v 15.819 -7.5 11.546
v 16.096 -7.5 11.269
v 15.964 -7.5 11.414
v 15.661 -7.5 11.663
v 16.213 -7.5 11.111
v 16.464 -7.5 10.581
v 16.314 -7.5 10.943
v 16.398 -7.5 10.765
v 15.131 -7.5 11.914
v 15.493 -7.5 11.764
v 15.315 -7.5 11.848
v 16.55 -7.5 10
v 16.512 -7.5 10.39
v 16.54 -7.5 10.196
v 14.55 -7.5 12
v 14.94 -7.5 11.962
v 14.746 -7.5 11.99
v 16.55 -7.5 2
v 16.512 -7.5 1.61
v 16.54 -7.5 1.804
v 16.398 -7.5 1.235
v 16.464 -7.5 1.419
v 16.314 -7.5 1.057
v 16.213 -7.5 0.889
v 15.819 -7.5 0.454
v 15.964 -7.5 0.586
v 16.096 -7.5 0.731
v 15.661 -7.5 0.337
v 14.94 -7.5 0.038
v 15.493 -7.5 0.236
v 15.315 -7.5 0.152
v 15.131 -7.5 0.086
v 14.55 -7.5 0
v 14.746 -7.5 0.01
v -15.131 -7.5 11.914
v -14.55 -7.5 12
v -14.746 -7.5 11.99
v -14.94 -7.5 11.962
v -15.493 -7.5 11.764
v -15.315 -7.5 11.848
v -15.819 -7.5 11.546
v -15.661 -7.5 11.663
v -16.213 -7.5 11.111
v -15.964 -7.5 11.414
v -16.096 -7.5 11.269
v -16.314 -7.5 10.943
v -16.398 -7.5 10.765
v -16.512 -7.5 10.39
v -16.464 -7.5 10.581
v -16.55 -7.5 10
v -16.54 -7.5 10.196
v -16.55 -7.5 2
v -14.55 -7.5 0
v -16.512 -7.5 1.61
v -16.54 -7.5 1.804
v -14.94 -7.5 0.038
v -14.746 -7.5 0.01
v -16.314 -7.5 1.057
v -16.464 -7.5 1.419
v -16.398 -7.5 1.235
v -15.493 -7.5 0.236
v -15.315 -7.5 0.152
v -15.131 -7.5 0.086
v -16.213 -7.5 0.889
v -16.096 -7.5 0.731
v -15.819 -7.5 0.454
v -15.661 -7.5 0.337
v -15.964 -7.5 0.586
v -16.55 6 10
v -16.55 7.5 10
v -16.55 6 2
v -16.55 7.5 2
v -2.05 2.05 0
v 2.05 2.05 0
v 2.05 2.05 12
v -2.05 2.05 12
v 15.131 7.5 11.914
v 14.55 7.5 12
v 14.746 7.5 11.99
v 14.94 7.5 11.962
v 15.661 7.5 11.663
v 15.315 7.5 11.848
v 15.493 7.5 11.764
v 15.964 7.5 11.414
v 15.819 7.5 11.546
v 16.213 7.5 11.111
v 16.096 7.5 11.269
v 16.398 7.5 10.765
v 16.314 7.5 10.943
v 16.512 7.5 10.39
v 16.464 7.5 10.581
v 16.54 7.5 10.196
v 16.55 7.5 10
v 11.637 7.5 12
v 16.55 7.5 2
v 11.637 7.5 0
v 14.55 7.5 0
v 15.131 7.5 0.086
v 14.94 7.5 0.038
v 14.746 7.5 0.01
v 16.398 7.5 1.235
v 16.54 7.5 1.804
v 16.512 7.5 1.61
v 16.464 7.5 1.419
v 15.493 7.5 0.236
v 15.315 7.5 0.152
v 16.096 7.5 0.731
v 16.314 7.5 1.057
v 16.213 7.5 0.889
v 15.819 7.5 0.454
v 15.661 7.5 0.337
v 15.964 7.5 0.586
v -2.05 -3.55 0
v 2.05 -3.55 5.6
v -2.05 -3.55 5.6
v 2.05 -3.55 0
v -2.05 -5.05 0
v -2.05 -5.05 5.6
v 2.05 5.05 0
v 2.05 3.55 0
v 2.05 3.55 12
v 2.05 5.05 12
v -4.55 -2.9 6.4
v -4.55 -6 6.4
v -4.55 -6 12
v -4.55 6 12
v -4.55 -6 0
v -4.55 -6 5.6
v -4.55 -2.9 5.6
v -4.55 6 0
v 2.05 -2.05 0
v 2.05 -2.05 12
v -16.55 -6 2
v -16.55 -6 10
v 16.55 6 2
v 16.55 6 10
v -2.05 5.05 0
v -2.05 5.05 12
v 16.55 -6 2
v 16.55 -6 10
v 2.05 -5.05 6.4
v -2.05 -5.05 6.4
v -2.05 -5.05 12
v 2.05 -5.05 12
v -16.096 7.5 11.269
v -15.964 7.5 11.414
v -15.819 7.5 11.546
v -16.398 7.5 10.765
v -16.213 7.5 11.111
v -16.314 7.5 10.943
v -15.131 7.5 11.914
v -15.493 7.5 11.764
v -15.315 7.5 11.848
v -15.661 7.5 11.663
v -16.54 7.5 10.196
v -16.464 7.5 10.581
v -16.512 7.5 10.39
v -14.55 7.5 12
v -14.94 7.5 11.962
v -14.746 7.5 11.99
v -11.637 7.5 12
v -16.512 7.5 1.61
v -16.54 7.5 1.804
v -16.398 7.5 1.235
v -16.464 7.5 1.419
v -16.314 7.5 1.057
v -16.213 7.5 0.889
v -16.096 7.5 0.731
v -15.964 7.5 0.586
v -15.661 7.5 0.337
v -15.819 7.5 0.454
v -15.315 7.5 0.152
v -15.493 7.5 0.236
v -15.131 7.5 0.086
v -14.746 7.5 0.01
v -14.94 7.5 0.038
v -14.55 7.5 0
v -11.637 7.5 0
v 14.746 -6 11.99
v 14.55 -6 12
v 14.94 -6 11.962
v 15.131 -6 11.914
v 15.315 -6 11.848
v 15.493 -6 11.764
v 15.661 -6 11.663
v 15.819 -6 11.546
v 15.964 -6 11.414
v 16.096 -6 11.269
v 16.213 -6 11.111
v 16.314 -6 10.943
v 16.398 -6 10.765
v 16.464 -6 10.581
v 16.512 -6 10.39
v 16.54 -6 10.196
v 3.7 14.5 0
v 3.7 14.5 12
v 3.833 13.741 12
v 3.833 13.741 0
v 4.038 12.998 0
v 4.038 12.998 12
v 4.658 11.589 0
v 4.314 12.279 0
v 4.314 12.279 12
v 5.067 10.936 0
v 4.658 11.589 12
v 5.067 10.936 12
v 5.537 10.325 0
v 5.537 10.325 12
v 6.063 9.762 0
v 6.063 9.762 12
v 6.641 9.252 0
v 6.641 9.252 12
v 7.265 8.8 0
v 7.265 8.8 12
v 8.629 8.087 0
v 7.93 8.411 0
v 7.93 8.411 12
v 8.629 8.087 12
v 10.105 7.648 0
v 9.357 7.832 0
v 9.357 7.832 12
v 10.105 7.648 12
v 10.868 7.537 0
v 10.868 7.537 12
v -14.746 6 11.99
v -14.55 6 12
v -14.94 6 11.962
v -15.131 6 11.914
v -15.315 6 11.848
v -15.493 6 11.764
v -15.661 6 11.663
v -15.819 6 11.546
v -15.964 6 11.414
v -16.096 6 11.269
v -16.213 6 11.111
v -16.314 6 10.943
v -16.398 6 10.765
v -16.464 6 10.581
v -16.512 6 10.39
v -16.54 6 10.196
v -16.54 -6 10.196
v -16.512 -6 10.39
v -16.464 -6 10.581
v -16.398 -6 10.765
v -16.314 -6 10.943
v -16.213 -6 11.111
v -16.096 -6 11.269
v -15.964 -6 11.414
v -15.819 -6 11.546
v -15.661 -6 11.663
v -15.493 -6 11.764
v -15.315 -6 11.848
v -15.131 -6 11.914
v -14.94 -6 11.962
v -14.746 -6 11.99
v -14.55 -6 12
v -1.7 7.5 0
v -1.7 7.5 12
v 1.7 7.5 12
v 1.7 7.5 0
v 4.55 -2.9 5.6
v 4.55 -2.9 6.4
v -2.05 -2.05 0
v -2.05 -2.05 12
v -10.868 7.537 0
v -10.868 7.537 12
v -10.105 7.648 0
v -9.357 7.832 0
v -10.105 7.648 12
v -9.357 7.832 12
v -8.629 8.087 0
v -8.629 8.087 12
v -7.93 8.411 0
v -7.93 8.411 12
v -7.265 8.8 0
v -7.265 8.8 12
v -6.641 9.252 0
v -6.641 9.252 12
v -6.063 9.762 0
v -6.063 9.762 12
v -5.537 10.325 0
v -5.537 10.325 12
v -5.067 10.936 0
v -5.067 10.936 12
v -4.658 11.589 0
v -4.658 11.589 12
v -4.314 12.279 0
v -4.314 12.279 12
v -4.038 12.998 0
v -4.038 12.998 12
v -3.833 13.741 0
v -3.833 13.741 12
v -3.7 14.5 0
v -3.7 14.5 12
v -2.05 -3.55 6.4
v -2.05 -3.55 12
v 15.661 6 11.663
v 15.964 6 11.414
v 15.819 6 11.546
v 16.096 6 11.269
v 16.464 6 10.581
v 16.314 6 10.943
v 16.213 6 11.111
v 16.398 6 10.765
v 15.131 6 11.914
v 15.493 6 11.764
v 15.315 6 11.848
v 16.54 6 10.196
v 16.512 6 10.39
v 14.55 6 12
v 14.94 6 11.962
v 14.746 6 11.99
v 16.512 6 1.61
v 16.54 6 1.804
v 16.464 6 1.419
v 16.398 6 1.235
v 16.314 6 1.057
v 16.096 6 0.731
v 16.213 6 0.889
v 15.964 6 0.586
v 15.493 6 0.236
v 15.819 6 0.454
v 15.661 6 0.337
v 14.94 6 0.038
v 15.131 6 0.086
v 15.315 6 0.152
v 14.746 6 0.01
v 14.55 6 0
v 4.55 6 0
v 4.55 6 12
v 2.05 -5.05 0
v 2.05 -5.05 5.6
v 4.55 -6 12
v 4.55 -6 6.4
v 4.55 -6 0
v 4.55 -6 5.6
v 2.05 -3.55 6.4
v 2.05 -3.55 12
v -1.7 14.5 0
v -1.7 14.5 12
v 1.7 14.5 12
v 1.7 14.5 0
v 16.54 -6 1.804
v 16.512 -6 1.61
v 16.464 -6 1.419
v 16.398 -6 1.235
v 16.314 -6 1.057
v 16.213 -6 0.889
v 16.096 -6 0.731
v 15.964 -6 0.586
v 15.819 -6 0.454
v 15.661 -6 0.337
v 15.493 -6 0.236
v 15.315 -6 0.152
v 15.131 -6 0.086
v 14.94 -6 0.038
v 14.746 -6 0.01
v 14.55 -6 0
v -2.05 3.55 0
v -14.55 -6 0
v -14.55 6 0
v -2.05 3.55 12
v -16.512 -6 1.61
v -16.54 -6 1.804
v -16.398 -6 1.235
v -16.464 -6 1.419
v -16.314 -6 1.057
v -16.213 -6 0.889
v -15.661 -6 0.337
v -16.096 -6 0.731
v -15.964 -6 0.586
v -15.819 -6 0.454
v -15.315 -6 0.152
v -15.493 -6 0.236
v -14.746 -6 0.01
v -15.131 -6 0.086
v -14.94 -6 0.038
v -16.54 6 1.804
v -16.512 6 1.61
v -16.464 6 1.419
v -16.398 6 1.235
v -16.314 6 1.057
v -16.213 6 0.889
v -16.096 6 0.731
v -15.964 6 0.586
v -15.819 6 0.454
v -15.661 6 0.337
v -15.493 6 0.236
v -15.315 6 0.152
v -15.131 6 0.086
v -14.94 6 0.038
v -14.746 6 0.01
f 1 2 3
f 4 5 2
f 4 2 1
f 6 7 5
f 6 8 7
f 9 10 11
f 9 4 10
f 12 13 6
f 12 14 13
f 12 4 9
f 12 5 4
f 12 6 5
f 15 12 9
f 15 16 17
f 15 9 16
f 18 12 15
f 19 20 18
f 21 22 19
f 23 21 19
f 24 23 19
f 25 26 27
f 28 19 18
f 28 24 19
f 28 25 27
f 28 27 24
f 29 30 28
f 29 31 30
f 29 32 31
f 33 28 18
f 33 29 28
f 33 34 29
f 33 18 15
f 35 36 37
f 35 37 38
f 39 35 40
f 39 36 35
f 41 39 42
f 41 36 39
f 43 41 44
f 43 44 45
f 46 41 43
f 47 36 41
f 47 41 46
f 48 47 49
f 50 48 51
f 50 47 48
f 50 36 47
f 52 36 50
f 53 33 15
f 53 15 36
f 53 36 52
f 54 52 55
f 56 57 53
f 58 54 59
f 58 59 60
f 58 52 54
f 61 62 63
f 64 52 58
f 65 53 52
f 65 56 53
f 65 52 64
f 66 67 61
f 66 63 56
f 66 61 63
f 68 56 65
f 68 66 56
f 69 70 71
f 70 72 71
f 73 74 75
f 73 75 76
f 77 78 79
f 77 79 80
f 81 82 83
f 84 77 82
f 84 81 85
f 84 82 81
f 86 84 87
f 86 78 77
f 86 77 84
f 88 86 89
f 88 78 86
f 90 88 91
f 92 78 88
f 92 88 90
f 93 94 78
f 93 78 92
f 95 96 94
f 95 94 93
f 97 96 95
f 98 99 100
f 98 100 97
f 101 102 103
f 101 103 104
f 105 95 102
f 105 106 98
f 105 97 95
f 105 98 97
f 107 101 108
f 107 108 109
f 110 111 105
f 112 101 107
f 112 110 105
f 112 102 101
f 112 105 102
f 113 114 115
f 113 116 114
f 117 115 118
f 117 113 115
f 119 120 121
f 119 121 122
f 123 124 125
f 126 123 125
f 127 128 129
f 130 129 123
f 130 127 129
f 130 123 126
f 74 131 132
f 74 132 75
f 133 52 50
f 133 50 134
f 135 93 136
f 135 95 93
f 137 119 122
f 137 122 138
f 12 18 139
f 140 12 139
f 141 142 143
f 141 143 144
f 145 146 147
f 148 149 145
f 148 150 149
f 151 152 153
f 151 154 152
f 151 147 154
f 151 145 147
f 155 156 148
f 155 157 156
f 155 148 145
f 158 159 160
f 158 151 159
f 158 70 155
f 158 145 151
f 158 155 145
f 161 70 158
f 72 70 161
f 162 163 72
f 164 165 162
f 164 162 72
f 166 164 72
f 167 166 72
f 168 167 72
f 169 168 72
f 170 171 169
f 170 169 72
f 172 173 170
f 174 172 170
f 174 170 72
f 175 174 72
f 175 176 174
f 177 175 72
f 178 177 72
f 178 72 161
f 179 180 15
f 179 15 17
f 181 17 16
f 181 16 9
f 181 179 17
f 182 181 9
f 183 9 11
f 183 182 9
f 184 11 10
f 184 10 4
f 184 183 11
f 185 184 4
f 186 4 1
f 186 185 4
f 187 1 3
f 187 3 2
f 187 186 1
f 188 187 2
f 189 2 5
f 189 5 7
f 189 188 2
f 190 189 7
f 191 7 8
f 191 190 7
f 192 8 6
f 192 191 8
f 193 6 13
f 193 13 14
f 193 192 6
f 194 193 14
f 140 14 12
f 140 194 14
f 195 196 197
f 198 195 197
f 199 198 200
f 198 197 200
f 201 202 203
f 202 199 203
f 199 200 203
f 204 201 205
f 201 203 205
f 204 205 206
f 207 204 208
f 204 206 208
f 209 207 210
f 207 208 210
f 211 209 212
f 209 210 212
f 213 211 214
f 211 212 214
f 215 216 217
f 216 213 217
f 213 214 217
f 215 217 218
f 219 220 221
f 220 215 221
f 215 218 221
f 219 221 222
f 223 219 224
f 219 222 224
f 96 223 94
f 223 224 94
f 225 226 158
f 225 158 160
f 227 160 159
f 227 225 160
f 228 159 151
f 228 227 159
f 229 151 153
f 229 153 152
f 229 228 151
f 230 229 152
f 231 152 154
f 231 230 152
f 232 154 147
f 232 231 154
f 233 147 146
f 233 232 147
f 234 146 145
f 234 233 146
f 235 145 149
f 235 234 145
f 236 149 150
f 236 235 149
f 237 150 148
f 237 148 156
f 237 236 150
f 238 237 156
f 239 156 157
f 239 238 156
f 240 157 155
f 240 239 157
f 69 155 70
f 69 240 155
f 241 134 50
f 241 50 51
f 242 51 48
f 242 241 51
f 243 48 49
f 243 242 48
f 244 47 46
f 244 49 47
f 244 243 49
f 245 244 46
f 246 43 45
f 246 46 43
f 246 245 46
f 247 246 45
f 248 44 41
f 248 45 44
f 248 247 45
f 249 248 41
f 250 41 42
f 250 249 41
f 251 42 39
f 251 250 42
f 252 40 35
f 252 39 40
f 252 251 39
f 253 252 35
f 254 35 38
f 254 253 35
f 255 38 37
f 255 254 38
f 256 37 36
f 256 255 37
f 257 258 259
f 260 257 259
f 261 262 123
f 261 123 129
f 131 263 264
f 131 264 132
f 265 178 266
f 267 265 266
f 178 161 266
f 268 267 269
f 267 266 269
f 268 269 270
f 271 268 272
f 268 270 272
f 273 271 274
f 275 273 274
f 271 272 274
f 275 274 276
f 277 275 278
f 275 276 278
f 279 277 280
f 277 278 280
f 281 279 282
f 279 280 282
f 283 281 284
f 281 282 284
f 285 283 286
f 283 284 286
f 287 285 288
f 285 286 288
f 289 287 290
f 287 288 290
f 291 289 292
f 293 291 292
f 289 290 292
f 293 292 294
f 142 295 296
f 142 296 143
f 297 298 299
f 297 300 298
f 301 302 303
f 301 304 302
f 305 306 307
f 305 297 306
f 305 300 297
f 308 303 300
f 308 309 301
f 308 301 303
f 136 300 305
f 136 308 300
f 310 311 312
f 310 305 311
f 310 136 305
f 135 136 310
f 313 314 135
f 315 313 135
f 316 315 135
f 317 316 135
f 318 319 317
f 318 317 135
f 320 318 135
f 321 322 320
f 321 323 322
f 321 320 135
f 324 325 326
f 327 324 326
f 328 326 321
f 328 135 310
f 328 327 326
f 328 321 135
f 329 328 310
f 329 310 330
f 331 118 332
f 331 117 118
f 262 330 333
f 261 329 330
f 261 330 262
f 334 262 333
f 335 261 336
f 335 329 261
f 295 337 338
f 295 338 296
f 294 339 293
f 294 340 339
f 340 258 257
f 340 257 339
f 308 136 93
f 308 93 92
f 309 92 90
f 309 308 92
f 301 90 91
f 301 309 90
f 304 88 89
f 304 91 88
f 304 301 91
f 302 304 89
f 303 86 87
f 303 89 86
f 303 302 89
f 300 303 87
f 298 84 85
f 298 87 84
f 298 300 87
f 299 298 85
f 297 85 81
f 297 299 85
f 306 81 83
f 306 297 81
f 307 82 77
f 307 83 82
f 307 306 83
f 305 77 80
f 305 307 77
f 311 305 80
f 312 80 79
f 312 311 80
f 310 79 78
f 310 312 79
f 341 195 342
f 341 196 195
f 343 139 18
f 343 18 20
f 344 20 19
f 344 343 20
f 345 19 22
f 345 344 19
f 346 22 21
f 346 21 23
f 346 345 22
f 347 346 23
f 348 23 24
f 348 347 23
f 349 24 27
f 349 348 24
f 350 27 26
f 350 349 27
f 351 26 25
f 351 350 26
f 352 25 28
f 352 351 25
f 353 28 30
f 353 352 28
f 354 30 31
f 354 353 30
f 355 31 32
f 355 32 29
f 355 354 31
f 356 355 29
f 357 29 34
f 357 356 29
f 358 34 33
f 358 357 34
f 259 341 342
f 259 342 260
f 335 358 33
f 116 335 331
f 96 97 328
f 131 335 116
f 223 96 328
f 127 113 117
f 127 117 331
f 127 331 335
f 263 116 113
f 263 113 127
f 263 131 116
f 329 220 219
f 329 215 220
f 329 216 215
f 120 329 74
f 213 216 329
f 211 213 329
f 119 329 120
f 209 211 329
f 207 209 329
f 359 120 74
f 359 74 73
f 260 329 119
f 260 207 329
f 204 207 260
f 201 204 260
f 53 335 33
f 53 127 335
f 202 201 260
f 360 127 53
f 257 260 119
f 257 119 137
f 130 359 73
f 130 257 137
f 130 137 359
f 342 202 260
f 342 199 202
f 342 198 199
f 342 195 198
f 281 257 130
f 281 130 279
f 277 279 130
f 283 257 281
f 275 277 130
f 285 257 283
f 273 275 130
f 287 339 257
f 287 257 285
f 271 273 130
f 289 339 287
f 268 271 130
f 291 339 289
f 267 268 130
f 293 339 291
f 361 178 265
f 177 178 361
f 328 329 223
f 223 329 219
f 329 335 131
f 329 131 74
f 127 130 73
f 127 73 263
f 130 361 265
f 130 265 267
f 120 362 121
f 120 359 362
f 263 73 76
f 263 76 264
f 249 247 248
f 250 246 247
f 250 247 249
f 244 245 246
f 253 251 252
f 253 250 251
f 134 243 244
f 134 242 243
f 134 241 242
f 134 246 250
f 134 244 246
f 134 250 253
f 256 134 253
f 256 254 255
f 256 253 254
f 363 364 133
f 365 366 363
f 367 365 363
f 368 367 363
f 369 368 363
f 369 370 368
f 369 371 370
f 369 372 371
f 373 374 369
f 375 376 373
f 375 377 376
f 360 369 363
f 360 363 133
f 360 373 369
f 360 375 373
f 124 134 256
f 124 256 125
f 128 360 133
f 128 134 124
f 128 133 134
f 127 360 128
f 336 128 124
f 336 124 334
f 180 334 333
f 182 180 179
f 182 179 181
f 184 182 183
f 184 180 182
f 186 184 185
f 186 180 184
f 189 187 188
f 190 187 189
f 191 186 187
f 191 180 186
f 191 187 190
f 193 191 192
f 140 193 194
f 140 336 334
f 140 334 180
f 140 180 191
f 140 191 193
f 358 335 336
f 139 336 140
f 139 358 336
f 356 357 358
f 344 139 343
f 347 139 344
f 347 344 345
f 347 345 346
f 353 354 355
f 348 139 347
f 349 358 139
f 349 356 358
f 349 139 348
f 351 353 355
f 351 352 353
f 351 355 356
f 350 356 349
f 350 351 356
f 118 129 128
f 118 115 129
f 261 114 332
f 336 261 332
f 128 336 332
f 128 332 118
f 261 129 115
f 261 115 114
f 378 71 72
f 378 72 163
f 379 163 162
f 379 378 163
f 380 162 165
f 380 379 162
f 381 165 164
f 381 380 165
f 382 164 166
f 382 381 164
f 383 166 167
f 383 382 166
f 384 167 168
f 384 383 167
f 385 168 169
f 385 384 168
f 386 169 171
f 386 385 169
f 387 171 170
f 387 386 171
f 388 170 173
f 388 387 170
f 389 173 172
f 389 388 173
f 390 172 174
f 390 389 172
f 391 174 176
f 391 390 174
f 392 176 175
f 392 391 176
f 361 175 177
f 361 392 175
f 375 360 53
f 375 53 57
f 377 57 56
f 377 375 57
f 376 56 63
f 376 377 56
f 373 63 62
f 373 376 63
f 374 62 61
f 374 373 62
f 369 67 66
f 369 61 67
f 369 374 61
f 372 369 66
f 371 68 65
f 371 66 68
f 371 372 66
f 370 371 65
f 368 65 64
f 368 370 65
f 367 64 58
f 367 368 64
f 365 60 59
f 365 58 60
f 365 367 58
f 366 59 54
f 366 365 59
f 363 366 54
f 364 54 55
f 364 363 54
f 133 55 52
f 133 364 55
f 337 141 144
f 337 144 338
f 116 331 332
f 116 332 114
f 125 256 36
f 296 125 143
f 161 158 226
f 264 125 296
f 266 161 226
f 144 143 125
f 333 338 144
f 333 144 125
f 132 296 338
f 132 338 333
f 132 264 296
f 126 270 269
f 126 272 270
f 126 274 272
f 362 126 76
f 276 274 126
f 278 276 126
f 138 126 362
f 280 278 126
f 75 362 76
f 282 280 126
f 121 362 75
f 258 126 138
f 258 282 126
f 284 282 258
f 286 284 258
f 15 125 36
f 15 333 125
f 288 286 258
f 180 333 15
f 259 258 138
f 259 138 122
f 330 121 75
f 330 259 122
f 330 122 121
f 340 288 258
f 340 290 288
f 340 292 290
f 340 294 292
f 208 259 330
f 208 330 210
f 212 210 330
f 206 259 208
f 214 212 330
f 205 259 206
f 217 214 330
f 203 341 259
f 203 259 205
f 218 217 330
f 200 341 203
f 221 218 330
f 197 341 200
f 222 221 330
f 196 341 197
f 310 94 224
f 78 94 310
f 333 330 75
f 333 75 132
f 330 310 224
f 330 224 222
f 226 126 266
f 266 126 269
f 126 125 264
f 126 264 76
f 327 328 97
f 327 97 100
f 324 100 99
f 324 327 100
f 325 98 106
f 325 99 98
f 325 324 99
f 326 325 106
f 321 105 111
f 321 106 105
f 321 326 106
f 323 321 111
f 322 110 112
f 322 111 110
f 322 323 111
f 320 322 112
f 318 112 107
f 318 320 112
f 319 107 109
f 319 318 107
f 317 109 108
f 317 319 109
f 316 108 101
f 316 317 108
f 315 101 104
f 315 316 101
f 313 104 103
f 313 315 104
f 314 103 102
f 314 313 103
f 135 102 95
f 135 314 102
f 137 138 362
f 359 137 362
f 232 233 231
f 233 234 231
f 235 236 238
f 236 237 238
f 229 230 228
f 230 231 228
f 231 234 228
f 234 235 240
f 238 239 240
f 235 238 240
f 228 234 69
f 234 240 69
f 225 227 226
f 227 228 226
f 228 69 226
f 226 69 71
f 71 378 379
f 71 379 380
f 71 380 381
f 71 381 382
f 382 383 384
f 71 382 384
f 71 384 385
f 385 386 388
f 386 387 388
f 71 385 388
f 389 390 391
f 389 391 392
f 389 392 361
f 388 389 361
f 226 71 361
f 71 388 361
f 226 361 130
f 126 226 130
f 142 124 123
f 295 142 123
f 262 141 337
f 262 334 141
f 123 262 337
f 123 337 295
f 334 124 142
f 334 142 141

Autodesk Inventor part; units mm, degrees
sketch "Sketch1" plane through (0, 0, 0) normal (0, 0, 1) x (1, 0, 0)
  line L0 (-4.55, 7.5) -> (4.55, 7.5)
  line L1 (4.55, 7.5) -> (4.55, -7.5)
  line L2 (4.55, -7.5) -> (-4.55, -7.5)
  line L3 (-4.55, -7.5) -> (-4.55, 7.5)
  line L4 (-4.55, 7.5) -> (4.55, -7.5) construction
  line L5 (4.55, 7.5) -> (-4.55, -7.5) construction
  line L6 (-2.05, -2.05) -> (2.05, -2.05)
  line L7 (2.05, -2.05) -> (2.05, 2.05)
  line L8 (2.05, 2.05) -> (-2.05, 2.05)
  line L9 (-2.05, 2.05) -> (-2.05, -2.05)
  line L10 (-2.05, -2.05) -> (2.05, 2.05) construction
  line L11 (2.05, -2.05) -> (-2.05, 2.05) construction
  line L12 (-4.55, 7.5) -> (-16.55, 7.5)
  line L13 (-16.55, 7.5) -> (-16.55, 6)
  line L14 (-16.55, 6) -> (-4.55, 6)
  line L15 (-4.55, 6) -> (-4.55, 7.5)
  line L16 (-4.55, -7.5) -> (-16.55, -7.5)
  line L17 (-16.55, -7.5) -> (-16.55, -6)
  line L18 (-16.55, -6) -> (-4.55, -6)
  line L19 (-4.55, -6) -> (-4.55, -7.5)
  line L20 (4.55, 7.5) -> (16.55, 7.5)
  line L21 (16.55, 7.5) -> (16.55, 6)
  line L22 (16.55, 6) -> (4.55, 6)
  line L23 (4.55, 6) -> (4.55, 7.5)
  line L24 (4.55, -7.5) -> (16.55, -7.5)
  line L25 (16.55, -7.5) -> (16.55, -6)
  line L26 (16.55, -6) -> (4.55, -6)
  line L27 (4.55, -6) -> (4.55, -7.5)
  point P0 (0, 0)
  point P1 (-4.55, 6)
  point P2 (-4.55, -6)
  point P3 (4.55, 6)
  dimension "d0" = 15
  dimension "d1" = 9.1
  dimension "d2" = 4.1
  dimension "d3" = 4.1
  dimension "d4" = 12
  dimension "d5" = 1.5
  dimension "d8" = 1.5
  dimension "d9" = 12
  dimension "d10" = 12
  dimension "d11" = 1.5
  dimension "d12" = 12
extrude "Extrusion1" add sketch "Sketch1" along normal blind 12
sketch "Sketch2" plane through (0, 0, 12) normal (0, 0, 1) x (1, 0, 0)
  line L0 (16.55, 7.5) -> (-16.55, 7.5) projected
  line L1 (-3.7, 7.5) -> (-1.7, 7.5)
  line L2 (-1.7, 7.5) -> (-1.7, 14.5)
  line L3 (-1.7, 14.5) -> (-3.7, 14.5)
  line L4 (-3.7, 14.5) -> (-3.7, 7.5)
  line L5 (1.7, 7.5) -> (3.7, 7.5)
  line L6 (3.7, 7.5) -> (3.7, 14.5)
  line L7 (3.7, 14.5) -> (1.7, 14.5)
  line L8 (1.7, 14.5) -> (1.7, 7.5)
  point P0 (0, 0)
  dimension "d15" = 2
  dimension "d16" = 2
  dimension "d17" = 7
  dimension "d18" = 7
  dimension "d19" = 1.7
  dimension "d20" = 1.7
extrude "Extrusion2" add sketch "Sketch2" against normal up to surface (12 mm away)
fillet "Fillet1" radius 8 2 edges at (3.7, 7.5, 6) (-3.7, 7.5, 6)
sketch "Sketch3" plane through (4.55, -6, 0) normal (1, 0, 0) x (0, 0, -1)
  line L0 (-6.4, 3.1) -> (-5.6, 3.1)
  line L1 (-5.6, 3.1) -> (-5.6, 0)
  line L2 (-5.6, 0) -> (-6.4, 0)
  line L3 (-6.4, 0) -> (-6.4, 3.1)
  line L4 (0, 12) -> (-12, 12) projected
  line L5 (0, 0) -> (0, 12) projected
  line L6 (0, 0) -> (-12, 0) projected
  point P0 (0, 6)
  dimension "d24" = 3.1
  dimension "d25" = 0.8
  dimension "d30" = 0
  dimension "d39" = 12
  dimension "d40" = 5.6
extrude "Extrusion3" cut sketch "Sketch3" against normal through all
sketch "Sketch5" plane through (0, 0, 0) normal (0, 0, -1) x (-1, 0, 0)
  line L0 (-2.05, 5.05) -> (2.05, 5.05)
  line L1 (2.05, 5.05) -> (2.05, 3.55)
  line L2 (2.05, 3.55) -> (-2.05, 3.55)
  line L3 (-2.05, 3.55) -> (-2.05, 5.05)
  line L4 (-2.05, -3.55) -> (2.05, -3.55)
  line L5 (2.05, -3.55) -> (2.05, -5.05)
  line L6 (2.05, -5.05) -> (-2.05, -5.05)
  line L7 (-2.05, -5.05) -> (-2.05, -3.55)
  line L8 (2.05, 2.05) -> (-2.05, 2.05) projected
  line L9 (2.05, -2.05) -> (2.05, 2.05) projected
  line L10 (-2.05, -2.05) -> (2.05, -2.05) projected
  point P0 (0, 0)
  dimension "d31" = 4.1
  dimension "d32" = 4.1
  dimension "d33" = 1.5
  dimension "d34" = 1.5
  dimension "d35" = 1.5
  dimension "d36" = 1.5
extrude "Extrusion4" cut sketch "Sketch5" against normal through all
fillet "Fillet2" radius 2 8 edges at (-16.55, 6.75, 0) (-16.55, 6.75, 12) (-16.55, -6.75, 0) (-16.55, -6.75, 12) (16.55, 6.75, 12) (16.55, -6.75, 12) (16.55, 6.75, 0) (16.55, -6.75, 0)
equation "\"d40\" = -0.5 * d25 + 0.5 * d39"
equation "\"d31\" = d32"
properties part number "wing_honeycomb_interface"
